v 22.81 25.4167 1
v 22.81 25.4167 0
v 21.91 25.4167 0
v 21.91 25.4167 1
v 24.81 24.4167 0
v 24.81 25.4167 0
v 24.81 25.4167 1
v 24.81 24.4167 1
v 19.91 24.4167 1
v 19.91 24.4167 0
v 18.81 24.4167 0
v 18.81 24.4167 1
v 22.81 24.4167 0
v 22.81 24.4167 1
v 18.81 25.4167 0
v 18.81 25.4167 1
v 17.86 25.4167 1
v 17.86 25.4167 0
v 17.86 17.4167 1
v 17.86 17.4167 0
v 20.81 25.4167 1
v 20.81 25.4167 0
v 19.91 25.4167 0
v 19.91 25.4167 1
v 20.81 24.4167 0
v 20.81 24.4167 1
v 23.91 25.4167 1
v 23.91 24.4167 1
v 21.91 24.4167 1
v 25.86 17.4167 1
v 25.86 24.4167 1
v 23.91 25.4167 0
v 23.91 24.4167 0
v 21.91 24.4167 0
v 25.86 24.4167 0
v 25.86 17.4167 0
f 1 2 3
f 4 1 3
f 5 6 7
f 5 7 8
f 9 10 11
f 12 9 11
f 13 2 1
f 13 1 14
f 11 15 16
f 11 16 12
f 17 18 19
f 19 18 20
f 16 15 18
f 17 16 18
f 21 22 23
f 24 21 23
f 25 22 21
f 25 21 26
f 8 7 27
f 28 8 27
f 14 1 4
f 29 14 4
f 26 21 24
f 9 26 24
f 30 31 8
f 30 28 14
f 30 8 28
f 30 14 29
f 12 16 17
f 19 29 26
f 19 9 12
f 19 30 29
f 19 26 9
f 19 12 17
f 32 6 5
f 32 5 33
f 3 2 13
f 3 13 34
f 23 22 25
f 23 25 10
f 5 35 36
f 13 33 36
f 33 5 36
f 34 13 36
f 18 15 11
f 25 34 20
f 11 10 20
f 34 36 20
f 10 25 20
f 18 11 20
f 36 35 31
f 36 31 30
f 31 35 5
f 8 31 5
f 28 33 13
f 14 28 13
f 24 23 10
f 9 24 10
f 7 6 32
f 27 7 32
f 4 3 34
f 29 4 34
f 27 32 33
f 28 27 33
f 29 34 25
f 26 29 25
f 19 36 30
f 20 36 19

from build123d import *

# Parameters (mm, degrees)
BOX001_W              = 1.1
BOX001_H              = 1
BOX001_DEPTH          = 1
ARRAY_X_COUNT         = 4
ARRAY_X_PITCH         = 2
BOX_W                 = 8
BOX_H                 = 8
BOX_DEPTH             = 1
CLONE_PLACEMENT_ANGLE = 180


with BuildPart() as array:
    # Box001 → Box001 (new body)
    with BuildSketch(Plane(origin=(17.86, 30.4267, 0), x_dir=(1, 0, 0), z_dir=(0, 0, 1))):
        with Locations((0.55, 0.5)):
            Rectangle(BOX001_W, BOX001_H)
    extrude(amount=BOX001_DEPTH)

    # Array X: Array ×4


with BuildPart() as array_1:
    add(array.part)
    with Locations(*[(i * ARRAY_X_PITCH, 0, 0) for i in range(1, ARRAY_X_COUNT)]):
        add(array.part)


with BuildPart() as array_2:
    # Array placement: moved
    add(array_1.part.moved(Location((-0.05, 0, 0))))


with BuildPart() as fingersrev:
    # Box → Box (new body)
    with BuildSketch(Plane(origin=(17.86, 30.4267, 0), x_dir=(1, 0, 0), z_dir=(0, 0, 1))):
        with Locations((4, 4)):
            Rectangle(BOX_W, BOX_H)
    extrude(amount=BOX_DEPTH)

    # Cut: cut Array
    add(array_2.part, mode=Mode.SUBTRACT)


with BuildPart() as fingersrev_1:
    # Clone placement: moved
    add(fingersrev.part.moved(Location((43.72, 55.8434, 0))).rotate(Axis((43.72, 55.8434, 0), (0, 0, 1)), CLONE_PLACEMENT_ANGLE))


solid = fingersrev_1.part
